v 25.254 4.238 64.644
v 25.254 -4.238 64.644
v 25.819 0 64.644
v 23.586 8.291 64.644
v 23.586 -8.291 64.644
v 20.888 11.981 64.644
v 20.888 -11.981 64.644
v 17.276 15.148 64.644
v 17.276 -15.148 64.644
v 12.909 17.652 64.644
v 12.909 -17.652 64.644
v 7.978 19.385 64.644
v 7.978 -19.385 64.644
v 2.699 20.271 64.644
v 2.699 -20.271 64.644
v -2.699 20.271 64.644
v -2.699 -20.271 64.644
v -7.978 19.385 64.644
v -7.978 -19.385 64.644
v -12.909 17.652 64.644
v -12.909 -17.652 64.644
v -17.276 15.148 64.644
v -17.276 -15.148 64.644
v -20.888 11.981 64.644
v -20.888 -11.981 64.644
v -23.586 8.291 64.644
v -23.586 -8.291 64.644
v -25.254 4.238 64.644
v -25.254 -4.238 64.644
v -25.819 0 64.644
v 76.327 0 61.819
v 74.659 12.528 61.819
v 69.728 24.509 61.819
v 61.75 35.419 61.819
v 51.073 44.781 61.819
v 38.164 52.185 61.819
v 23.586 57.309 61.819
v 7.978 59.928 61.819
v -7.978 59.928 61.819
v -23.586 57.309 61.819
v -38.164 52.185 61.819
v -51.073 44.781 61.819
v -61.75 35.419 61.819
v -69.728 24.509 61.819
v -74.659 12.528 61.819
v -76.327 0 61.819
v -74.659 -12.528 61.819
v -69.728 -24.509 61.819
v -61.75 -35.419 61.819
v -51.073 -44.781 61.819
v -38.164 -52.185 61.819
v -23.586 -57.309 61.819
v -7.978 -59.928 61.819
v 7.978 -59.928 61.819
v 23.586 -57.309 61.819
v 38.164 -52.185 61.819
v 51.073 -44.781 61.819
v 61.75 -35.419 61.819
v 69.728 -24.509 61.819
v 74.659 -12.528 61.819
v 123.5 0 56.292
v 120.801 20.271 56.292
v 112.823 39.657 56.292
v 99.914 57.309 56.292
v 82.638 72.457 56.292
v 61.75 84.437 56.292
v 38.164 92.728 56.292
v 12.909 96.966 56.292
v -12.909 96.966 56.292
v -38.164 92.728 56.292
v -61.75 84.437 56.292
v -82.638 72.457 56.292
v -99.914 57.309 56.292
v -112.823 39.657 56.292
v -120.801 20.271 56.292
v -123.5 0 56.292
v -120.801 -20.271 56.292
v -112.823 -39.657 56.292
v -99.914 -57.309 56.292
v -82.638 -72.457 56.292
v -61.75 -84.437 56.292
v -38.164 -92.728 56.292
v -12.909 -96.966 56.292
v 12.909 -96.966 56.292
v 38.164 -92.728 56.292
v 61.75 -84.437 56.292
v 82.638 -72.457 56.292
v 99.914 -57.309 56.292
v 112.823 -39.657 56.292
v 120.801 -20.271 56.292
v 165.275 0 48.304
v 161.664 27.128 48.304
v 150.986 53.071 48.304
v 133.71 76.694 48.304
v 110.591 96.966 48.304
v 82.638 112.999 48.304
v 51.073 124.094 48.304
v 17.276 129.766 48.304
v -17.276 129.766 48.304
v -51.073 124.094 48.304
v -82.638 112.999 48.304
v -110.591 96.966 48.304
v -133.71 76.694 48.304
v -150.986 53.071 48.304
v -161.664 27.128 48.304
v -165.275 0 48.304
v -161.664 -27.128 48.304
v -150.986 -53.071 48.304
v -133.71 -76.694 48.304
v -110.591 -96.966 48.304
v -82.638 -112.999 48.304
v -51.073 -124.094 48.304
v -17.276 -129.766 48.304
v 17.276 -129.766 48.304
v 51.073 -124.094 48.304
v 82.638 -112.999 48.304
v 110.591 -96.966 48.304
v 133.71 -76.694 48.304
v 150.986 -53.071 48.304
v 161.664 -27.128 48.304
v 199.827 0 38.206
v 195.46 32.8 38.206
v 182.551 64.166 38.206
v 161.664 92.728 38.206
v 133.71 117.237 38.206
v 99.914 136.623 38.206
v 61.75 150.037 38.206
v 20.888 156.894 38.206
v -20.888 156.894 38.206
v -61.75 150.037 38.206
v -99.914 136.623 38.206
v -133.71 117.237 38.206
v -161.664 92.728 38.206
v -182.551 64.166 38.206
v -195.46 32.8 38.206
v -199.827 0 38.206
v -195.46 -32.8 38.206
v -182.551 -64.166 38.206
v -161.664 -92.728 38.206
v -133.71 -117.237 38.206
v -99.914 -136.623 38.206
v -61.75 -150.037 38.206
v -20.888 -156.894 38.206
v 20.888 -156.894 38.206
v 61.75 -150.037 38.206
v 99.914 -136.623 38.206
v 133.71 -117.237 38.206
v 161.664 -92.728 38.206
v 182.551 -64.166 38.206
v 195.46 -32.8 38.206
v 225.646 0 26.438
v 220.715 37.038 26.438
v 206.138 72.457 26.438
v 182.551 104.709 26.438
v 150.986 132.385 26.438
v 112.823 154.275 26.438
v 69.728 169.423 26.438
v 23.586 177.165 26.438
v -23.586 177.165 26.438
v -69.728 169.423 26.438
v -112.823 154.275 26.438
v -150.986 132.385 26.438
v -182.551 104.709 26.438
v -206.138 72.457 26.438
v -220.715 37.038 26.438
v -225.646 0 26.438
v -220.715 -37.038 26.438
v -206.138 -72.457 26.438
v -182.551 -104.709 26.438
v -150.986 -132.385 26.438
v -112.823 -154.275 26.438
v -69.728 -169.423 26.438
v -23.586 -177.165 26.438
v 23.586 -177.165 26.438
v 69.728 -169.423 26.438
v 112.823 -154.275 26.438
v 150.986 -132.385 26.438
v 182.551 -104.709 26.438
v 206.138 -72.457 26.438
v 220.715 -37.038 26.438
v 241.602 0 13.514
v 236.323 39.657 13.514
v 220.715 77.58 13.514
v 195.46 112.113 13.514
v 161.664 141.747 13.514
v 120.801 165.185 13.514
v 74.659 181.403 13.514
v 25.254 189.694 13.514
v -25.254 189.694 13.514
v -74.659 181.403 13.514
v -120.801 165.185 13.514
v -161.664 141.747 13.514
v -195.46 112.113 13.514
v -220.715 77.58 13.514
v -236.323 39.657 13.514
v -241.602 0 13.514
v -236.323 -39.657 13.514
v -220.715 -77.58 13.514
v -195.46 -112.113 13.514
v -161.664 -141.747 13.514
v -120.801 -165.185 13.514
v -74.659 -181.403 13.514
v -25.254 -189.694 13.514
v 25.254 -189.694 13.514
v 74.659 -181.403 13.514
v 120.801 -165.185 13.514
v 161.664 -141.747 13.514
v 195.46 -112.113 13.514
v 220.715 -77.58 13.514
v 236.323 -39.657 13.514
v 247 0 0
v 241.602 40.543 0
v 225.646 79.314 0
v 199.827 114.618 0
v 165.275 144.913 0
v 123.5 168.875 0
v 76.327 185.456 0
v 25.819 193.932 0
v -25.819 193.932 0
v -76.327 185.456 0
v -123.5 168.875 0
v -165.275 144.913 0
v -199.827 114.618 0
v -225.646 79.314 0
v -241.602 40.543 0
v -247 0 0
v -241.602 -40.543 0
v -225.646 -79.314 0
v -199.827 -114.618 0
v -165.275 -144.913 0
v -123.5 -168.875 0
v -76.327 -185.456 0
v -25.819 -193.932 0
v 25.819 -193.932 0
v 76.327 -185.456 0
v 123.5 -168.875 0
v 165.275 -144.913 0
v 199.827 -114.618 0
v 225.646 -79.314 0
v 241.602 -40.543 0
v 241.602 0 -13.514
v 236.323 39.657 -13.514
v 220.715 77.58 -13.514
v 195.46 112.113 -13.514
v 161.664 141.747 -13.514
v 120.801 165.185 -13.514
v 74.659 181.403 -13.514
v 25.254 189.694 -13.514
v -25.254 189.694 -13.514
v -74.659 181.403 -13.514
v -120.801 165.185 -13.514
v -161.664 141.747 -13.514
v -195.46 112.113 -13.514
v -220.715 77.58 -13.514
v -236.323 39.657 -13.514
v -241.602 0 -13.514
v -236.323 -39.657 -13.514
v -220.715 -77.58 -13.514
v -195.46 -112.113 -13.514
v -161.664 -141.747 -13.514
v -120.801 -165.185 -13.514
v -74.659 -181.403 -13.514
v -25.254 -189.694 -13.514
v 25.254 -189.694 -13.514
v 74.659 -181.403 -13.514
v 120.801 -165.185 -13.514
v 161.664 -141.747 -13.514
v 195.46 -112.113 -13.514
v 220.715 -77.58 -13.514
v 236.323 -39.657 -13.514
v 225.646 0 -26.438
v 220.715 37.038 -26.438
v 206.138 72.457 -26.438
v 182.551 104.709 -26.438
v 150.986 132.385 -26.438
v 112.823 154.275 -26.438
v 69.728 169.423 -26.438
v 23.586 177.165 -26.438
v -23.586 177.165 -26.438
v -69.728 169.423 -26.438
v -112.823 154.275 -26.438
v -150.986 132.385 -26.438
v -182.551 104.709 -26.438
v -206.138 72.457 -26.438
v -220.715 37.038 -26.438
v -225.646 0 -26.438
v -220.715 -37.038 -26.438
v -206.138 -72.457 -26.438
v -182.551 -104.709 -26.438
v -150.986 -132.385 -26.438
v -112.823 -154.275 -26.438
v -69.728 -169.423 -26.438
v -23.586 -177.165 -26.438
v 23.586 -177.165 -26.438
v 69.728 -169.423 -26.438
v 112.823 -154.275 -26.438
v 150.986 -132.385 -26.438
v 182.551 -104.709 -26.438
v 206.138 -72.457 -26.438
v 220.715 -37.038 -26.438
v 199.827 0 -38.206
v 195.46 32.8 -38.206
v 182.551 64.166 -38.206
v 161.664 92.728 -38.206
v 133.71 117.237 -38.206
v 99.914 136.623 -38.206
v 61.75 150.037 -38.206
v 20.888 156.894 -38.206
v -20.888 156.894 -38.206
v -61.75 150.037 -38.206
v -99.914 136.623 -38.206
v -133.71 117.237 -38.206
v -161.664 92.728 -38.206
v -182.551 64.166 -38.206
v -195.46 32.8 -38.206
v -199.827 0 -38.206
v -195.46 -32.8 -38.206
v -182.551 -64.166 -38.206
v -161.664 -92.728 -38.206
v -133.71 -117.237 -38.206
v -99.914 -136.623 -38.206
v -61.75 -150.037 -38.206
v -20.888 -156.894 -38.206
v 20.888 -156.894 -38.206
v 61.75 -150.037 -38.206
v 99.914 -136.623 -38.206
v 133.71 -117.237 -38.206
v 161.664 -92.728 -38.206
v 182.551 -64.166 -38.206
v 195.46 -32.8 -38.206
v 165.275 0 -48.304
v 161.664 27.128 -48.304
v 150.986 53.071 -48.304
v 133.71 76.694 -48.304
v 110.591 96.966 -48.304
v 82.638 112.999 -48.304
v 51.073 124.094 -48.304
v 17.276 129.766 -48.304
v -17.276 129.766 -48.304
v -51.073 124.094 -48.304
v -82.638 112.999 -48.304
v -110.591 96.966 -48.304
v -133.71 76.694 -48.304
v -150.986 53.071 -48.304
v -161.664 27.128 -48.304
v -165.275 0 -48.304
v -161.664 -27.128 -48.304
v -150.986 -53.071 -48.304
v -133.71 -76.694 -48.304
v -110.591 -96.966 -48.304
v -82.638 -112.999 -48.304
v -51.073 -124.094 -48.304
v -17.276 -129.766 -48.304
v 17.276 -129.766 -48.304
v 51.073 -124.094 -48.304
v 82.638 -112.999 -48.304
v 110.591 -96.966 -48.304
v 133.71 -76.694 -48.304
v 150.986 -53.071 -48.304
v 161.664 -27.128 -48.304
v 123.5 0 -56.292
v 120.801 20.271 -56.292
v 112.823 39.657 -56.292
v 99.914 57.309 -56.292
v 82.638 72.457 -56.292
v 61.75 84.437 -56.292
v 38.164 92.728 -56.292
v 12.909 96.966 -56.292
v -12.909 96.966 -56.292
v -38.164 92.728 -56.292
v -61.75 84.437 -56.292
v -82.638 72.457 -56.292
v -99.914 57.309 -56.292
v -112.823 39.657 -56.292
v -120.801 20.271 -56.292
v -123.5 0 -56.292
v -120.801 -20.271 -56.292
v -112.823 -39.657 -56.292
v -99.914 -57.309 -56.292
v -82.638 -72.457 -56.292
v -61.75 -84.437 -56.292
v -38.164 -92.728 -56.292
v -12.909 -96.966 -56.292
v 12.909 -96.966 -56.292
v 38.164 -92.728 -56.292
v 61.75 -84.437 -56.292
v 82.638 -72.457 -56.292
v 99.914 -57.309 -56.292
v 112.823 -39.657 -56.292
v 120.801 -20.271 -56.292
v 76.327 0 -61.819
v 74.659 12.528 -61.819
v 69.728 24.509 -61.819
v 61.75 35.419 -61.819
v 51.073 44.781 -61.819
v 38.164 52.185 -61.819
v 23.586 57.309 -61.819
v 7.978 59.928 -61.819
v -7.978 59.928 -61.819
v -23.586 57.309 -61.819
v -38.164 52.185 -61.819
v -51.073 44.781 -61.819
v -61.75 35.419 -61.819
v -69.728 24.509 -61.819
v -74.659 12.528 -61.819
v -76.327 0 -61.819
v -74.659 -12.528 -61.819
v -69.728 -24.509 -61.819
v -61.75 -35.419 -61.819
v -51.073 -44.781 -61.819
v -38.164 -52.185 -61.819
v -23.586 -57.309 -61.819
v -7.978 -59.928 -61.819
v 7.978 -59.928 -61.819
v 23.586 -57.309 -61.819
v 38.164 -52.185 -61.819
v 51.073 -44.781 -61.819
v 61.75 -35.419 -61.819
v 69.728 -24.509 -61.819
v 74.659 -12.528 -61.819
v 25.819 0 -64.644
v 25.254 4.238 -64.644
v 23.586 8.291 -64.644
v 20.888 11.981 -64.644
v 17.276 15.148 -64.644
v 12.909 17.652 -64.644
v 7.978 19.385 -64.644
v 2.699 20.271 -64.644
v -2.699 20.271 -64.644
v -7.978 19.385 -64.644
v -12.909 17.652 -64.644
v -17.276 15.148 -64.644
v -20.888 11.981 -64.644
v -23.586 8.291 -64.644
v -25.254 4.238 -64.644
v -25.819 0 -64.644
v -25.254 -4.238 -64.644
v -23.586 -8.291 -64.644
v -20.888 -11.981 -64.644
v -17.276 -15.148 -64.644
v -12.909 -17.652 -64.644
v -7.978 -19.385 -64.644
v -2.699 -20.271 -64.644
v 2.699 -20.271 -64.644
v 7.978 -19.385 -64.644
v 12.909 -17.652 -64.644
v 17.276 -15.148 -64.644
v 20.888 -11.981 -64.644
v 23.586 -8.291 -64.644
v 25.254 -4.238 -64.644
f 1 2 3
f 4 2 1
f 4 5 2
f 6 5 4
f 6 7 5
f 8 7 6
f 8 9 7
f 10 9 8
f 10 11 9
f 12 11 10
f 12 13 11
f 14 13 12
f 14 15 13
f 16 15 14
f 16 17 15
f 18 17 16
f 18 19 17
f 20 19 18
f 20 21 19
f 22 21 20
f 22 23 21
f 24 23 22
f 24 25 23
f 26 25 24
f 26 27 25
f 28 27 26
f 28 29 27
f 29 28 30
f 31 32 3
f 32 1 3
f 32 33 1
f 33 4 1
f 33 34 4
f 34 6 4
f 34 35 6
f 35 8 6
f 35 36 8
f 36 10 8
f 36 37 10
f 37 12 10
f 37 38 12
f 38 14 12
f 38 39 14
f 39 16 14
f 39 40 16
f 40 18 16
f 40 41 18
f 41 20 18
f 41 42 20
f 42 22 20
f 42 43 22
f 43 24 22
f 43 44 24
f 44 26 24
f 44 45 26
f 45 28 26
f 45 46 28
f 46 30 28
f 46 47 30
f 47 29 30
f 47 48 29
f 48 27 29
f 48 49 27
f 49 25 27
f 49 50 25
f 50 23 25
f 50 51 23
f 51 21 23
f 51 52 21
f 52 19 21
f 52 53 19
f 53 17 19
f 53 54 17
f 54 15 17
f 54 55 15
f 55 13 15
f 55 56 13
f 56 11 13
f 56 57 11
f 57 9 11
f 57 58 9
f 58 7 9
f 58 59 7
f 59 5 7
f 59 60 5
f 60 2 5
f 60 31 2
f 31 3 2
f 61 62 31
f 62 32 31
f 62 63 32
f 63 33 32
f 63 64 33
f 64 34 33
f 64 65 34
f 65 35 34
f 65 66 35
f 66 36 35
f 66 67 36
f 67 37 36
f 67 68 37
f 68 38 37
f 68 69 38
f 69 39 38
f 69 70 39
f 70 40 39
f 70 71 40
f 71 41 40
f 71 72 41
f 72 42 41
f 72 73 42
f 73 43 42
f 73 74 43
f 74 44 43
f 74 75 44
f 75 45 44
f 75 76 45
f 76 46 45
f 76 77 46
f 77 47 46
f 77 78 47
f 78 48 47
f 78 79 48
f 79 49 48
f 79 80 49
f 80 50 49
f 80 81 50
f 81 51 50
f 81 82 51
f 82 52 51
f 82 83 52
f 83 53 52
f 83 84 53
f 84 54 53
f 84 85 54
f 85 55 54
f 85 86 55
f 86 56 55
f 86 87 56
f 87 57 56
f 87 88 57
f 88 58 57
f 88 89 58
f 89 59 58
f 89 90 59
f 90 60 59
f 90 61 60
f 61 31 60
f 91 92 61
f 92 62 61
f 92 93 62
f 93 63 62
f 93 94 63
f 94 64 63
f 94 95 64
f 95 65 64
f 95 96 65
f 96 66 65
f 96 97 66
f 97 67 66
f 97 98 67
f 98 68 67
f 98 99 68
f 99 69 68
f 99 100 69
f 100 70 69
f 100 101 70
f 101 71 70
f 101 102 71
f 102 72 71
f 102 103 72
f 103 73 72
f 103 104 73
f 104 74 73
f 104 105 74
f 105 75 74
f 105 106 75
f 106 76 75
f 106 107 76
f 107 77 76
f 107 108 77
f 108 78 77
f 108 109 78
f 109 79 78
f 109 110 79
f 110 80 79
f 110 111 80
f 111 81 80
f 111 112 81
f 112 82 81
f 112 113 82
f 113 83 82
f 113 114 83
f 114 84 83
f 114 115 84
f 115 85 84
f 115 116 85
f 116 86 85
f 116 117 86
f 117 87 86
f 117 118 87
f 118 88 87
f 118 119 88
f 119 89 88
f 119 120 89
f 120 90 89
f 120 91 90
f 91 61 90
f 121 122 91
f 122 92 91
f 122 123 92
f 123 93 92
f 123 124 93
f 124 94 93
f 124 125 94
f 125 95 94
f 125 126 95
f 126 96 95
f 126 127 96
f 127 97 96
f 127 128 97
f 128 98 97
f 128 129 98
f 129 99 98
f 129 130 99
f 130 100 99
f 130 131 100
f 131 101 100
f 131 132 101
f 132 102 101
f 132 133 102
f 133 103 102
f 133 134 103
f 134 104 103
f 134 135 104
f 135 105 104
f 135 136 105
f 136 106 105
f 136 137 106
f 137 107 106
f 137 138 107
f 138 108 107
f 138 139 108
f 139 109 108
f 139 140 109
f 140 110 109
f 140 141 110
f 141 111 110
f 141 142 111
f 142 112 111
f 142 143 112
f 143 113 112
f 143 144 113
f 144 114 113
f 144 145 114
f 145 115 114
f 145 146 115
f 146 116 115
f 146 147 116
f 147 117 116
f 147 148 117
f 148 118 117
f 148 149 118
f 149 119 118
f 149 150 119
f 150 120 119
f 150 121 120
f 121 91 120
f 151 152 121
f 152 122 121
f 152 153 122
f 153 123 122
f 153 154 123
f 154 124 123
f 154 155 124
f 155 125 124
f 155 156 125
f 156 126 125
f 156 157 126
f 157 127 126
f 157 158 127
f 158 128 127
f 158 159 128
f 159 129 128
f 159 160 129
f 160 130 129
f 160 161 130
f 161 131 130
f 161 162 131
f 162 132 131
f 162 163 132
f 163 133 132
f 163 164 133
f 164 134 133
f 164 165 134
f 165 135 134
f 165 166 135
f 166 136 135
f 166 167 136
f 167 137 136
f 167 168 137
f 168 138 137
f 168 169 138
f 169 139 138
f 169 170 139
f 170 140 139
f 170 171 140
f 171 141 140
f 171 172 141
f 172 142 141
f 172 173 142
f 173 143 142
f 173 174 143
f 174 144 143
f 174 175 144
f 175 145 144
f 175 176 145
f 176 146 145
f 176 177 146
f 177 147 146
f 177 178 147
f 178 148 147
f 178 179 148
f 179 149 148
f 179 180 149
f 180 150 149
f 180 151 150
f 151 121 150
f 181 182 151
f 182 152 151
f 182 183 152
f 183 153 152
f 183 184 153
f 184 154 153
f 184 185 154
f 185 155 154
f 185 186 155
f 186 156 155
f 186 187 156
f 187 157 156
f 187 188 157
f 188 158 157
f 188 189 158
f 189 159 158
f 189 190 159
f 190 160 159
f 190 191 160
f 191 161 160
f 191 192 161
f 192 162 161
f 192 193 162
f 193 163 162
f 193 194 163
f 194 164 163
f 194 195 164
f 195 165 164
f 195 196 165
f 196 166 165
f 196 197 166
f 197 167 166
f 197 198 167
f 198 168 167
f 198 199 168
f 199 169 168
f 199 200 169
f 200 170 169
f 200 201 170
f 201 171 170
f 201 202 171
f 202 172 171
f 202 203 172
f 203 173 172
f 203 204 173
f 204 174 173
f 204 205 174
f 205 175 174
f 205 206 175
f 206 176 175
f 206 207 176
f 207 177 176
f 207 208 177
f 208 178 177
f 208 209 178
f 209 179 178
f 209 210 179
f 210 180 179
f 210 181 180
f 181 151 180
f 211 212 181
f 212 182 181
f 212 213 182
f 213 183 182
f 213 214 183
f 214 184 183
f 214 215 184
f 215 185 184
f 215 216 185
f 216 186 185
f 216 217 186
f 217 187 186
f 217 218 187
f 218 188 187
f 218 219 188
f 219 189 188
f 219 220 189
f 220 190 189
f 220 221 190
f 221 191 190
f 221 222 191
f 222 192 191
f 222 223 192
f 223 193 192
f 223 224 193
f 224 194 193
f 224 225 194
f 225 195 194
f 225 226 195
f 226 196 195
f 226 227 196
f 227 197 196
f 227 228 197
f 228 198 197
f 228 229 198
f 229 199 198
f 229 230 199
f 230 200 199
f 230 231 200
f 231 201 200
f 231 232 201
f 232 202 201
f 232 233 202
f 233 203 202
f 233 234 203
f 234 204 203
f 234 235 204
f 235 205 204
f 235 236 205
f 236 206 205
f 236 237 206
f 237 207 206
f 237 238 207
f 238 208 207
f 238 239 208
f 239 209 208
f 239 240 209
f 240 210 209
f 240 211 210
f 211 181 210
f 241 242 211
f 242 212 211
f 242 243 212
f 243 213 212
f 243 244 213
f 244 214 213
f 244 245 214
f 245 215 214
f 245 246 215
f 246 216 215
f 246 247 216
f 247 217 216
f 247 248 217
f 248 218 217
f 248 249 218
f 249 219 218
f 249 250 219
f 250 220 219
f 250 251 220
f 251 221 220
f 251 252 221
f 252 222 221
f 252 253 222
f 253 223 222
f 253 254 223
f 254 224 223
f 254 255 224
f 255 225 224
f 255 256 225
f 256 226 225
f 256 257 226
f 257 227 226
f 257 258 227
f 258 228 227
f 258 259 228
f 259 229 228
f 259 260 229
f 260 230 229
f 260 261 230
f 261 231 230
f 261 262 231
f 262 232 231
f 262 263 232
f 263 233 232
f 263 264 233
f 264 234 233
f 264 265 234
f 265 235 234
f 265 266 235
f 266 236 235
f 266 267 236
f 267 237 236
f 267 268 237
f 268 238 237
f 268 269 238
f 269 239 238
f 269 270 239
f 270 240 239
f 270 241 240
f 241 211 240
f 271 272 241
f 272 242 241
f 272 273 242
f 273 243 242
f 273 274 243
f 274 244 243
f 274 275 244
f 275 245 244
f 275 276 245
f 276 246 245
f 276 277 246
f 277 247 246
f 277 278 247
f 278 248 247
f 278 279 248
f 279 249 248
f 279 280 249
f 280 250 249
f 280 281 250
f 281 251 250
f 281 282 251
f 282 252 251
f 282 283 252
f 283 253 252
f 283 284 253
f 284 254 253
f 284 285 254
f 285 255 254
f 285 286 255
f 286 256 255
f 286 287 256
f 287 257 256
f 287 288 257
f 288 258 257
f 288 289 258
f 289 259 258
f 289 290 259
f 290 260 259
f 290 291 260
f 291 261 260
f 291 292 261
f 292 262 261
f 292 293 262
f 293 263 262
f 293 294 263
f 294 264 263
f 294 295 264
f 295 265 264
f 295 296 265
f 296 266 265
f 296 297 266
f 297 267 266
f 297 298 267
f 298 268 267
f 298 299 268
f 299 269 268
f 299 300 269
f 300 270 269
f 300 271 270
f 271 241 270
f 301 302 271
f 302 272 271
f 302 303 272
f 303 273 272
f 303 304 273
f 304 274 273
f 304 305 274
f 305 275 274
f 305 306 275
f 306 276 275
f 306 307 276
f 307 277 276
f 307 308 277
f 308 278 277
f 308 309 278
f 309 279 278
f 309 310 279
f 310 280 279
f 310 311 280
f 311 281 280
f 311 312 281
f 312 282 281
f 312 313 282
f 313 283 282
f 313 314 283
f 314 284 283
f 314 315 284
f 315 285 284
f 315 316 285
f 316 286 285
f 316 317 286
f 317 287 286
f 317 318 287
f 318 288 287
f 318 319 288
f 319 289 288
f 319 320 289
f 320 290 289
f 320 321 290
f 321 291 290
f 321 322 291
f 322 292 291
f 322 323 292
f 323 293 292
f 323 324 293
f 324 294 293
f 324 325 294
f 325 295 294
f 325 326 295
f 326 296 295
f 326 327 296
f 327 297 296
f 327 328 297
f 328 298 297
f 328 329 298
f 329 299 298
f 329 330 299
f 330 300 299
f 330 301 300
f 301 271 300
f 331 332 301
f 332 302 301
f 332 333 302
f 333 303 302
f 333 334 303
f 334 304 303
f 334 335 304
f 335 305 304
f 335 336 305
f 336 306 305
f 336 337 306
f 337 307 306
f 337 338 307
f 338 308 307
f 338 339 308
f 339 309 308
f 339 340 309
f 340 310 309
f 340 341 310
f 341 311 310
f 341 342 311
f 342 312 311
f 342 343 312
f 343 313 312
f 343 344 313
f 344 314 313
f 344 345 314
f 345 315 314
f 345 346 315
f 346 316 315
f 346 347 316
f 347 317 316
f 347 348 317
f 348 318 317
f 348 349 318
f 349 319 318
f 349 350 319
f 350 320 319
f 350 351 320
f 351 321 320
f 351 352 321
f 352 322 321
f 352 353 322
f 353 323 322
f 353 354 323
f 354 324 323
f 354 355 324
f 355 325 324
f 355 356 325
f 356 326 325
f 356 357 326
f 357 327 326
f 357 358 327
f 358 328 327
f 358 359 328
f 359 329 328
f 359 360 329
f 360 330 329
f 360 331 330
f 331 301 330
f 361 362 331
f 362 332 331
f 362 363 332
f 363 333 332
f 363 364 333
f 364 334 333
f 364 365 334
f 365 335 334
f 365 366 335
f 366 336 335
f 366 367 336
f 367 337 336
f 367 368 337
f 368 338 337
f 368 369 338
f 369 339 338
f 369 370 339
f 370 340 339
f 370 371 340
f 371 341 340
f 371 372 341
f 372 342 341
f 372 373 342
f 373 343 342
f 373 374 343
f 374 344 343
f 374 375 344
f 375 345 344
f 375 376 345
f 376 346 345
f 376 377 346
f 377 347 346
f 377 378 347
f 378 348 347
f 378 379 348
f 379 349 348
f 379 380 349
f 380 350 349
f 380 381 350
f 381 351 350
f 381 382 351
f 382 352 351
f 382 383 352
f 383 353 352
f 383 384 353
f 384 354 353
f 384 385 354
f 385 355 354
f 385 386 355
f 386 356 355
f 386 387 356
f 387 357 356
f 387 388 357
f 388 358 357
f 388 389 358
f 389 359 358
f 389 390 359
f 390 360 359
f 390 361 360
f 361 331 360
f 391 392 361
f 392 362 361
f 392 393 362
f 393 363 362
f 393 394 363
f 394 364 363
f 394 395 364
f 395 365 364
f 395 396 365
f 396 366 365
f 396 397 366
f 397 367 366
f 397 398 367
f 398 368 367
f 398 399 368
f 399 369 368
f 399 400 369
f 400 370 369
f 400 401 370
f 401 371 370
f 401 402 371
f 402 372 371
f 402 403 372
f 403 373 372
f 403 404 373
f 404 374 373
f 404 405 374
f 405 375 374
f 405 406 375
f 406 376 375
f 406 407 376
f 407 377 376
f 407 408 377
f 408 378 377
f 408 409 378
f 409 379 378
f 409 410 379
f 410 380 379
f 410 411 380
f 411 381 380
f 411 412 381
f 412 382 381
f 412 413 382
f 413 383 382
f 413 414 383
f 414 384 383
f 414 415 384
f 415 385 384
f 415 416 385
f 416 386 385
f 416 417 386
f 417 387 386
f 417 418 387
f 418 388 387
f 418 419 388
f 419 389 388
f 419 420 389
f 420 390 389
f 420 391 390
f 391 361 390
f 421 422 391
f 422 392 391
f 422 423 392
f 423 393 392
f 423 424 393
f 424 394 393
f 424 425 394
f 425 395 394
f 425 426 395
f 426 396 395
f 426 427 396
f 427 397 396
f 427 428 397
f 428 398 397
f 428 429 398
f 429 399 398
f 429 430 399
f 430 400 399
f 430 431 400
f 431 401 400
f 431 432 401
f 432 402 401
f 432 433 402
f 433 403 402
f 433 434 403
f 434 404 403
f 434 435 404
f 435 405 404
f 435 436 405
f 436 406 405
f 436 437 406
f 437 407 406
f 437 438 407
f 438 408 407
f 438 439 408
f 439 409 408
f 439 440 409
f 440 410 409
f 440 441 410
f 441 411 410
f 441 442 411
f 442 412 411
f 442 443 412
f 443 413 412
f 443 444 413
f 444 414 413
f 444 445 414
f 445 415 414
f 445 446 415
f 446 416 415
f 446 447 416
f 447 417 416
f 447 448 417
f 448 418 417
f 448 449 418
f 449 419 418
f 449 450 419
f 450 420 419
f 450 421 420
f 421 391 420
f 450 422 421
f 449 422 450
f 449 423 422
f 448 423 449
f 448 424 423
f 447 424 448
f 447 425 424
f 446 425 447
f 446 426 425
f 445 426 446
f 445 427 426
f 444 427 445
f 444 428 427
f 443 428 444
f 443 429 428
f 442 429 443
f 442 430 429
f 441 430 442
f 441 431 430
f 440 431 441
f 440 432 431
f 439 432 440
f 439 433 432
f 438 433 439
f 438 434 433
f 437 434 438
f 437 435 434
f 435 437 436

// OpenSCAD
// Generated by SolidPython 1.0.1 on 2020-07-29 00:46:54


scale(v = [19, 15, 5]) {
	sphere(r = 13);
}
/***********************************************
*********      SolidPython code:      **********
************************************************
 
# import packages: SolidPython
from solid import *
from solid.utils import *
from itertools import chain, combinations, permutations


class Resize:

    def __init__(self, scad_file):
        self.scad_file = scad_file
        #self.scad_file = import_scad(scad_file)
        # cone/cylinder param:
        self.r1 = 0
        self.r2 = 0
        self.h = 0
        # rectangular prism param:
        self.w = 0
        self.l = 0
        # ellipse param:
        self.r = 0

    # import OpenScad code (file name corresponds to shape)


    # classify shape + parameters
    def assign(self, param1, param2, param3):
        if self.scad_file == 'cone.scad':
            self.r1 = param1
            self.r2 = param2
            self.h = param3
        elif self.scad_file == 'cylinder.scad':
            self.r1 = param1
            self.r2 = param2
            self.h = param3
        elif self.scad_file == 'rectangularPrism.scad':
            self.h = param1
            self.l = param2
            self.w = param3
        else:
            self.r = param1
            self.h = param2

    # resize parameters
    def iterate(self):
        x = range(3, 20, 2)
        i = 1
        if self.scad_file == 'cone.scad':
            tempList = list(permutations(x, 2))
            for temp in tempList:
                param1 = temp[0]
                param2 = temp[1]
                filepath = 'produced_scad_files/' + 'cone' + str(param1) + '_' + str(param2) + '_' + '.scad'
                scad_render_to_file(cylinder(h=param1, r1=param2, r2=0), filepath)

        elif self.scad_file == 'cylinder.scad':
            tempList = list(permutations(x, 3))
            for temp in tempList:
                param1 = temp[0]
                param2 = temp[1]
                filepath = 'produced_scad_files/' + 'cylinder' + str(param1) + '_' + str(param2) + '_' + '.scad'
                scad_render_to_file(cylinder(h=param1, r1=param2, r2=param2), filepath)

        elif self.scad_file == 'rectangularPrism.scad':
            tempList = list(permutations(x, 3))
            for temp in tempList:
                param1 = temp[0]
                param2 = temp[1]
                param3 = temp[2]
                filepath = 'produced_scad_files/' + 'rectangularPrism' + str(param1) + '_' + str(param2) + '_' + str(
                    param3) + '.scad'
                scad_render_to_file(cube(size=(param1, param2, param3)), filepath)

        elif self.scad_file == 'ellipse.scad':
            tempList = list(permutations(x, 4))
            for temp in tempList:
                param1 = temp[0]
                param2 = temp[1]
                param3 = temp[2]
                param4 = temp[3]
                filepath = 'produced_scad_files/' + 'ellipse' + str(param1) + '_' + str(param2) + '_' + str(param3) + '_' + str(param4) + '.scad'
                scad_render_to_file(scale([param1, param2, param3])(sphere(r=param4)), filepath)

    def render_to_scadfile(self):
        scad_render_to_file(scad, 'example.scad') 
 
************************************************/
